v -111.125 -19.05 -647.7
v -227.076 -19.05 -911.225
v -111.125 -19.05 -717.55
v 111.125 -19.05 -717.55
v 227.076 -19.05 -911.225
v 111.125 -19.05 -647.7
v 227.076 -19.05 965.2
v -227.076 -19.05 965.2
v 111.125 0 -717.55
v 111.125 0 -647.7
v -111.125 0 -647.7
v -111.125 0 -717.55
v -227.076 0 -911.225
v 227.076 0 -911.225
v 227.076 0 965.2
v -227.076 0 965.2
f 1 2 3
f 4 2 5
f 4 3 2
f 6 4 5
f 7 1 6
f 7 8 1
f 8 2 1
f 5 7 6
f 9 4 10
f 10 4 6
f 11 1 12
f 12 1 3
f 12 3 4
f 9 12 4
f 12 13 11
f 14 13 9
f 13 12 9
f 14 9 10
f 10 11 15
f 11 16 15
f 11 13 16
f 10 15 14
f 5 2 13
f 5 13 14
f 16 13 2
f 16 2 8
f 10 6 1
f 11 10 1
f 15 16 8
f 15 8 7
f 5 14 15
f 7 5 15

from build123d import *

# Parameters (mm, degrees)
F0_W      = 454.152
F0_H      = 1930.4
F1_DEPTH  = 19.05
F1_FACE_W = 454.152
F1_FACE_H = 19.05
F2_DEPTH  = 53.975
F4_DEPTH  = 25.4


with BuildPart() as f1:
    # F0 (on Front) → F1 (new body)
    with BuildSketch(Plane.XZ):
        Rectangle(F0_W, F0_H)
    extrude(amount=F1_DEPTH)

    # F1_face (on face) → F2 (cut)
    with BuildSketch(Plane(origin=(0, -9.525, -965.2), x_dir=(1, 0, 0), z_dir=(0, 0, -1))):
        Rectangle(F1_FACE_W, F1_FACE_H)
    extrude(amount=-F2_DEPTH, mode=Mode.SUBTRACT)

    # F3 (on face) → F4 (cut)
    with BuildSketch(Plane.XZ.offset(19.05)):
        Polygon((-111.125, -717.55), (0, -717.55), (111.125, -717.55), (111.125, -647.7), (-111.125, -647.7), align=None)
    extrude(amount=-F4_DEPTH, mode=Mode.SUBTRACT)


solid = f1.part
